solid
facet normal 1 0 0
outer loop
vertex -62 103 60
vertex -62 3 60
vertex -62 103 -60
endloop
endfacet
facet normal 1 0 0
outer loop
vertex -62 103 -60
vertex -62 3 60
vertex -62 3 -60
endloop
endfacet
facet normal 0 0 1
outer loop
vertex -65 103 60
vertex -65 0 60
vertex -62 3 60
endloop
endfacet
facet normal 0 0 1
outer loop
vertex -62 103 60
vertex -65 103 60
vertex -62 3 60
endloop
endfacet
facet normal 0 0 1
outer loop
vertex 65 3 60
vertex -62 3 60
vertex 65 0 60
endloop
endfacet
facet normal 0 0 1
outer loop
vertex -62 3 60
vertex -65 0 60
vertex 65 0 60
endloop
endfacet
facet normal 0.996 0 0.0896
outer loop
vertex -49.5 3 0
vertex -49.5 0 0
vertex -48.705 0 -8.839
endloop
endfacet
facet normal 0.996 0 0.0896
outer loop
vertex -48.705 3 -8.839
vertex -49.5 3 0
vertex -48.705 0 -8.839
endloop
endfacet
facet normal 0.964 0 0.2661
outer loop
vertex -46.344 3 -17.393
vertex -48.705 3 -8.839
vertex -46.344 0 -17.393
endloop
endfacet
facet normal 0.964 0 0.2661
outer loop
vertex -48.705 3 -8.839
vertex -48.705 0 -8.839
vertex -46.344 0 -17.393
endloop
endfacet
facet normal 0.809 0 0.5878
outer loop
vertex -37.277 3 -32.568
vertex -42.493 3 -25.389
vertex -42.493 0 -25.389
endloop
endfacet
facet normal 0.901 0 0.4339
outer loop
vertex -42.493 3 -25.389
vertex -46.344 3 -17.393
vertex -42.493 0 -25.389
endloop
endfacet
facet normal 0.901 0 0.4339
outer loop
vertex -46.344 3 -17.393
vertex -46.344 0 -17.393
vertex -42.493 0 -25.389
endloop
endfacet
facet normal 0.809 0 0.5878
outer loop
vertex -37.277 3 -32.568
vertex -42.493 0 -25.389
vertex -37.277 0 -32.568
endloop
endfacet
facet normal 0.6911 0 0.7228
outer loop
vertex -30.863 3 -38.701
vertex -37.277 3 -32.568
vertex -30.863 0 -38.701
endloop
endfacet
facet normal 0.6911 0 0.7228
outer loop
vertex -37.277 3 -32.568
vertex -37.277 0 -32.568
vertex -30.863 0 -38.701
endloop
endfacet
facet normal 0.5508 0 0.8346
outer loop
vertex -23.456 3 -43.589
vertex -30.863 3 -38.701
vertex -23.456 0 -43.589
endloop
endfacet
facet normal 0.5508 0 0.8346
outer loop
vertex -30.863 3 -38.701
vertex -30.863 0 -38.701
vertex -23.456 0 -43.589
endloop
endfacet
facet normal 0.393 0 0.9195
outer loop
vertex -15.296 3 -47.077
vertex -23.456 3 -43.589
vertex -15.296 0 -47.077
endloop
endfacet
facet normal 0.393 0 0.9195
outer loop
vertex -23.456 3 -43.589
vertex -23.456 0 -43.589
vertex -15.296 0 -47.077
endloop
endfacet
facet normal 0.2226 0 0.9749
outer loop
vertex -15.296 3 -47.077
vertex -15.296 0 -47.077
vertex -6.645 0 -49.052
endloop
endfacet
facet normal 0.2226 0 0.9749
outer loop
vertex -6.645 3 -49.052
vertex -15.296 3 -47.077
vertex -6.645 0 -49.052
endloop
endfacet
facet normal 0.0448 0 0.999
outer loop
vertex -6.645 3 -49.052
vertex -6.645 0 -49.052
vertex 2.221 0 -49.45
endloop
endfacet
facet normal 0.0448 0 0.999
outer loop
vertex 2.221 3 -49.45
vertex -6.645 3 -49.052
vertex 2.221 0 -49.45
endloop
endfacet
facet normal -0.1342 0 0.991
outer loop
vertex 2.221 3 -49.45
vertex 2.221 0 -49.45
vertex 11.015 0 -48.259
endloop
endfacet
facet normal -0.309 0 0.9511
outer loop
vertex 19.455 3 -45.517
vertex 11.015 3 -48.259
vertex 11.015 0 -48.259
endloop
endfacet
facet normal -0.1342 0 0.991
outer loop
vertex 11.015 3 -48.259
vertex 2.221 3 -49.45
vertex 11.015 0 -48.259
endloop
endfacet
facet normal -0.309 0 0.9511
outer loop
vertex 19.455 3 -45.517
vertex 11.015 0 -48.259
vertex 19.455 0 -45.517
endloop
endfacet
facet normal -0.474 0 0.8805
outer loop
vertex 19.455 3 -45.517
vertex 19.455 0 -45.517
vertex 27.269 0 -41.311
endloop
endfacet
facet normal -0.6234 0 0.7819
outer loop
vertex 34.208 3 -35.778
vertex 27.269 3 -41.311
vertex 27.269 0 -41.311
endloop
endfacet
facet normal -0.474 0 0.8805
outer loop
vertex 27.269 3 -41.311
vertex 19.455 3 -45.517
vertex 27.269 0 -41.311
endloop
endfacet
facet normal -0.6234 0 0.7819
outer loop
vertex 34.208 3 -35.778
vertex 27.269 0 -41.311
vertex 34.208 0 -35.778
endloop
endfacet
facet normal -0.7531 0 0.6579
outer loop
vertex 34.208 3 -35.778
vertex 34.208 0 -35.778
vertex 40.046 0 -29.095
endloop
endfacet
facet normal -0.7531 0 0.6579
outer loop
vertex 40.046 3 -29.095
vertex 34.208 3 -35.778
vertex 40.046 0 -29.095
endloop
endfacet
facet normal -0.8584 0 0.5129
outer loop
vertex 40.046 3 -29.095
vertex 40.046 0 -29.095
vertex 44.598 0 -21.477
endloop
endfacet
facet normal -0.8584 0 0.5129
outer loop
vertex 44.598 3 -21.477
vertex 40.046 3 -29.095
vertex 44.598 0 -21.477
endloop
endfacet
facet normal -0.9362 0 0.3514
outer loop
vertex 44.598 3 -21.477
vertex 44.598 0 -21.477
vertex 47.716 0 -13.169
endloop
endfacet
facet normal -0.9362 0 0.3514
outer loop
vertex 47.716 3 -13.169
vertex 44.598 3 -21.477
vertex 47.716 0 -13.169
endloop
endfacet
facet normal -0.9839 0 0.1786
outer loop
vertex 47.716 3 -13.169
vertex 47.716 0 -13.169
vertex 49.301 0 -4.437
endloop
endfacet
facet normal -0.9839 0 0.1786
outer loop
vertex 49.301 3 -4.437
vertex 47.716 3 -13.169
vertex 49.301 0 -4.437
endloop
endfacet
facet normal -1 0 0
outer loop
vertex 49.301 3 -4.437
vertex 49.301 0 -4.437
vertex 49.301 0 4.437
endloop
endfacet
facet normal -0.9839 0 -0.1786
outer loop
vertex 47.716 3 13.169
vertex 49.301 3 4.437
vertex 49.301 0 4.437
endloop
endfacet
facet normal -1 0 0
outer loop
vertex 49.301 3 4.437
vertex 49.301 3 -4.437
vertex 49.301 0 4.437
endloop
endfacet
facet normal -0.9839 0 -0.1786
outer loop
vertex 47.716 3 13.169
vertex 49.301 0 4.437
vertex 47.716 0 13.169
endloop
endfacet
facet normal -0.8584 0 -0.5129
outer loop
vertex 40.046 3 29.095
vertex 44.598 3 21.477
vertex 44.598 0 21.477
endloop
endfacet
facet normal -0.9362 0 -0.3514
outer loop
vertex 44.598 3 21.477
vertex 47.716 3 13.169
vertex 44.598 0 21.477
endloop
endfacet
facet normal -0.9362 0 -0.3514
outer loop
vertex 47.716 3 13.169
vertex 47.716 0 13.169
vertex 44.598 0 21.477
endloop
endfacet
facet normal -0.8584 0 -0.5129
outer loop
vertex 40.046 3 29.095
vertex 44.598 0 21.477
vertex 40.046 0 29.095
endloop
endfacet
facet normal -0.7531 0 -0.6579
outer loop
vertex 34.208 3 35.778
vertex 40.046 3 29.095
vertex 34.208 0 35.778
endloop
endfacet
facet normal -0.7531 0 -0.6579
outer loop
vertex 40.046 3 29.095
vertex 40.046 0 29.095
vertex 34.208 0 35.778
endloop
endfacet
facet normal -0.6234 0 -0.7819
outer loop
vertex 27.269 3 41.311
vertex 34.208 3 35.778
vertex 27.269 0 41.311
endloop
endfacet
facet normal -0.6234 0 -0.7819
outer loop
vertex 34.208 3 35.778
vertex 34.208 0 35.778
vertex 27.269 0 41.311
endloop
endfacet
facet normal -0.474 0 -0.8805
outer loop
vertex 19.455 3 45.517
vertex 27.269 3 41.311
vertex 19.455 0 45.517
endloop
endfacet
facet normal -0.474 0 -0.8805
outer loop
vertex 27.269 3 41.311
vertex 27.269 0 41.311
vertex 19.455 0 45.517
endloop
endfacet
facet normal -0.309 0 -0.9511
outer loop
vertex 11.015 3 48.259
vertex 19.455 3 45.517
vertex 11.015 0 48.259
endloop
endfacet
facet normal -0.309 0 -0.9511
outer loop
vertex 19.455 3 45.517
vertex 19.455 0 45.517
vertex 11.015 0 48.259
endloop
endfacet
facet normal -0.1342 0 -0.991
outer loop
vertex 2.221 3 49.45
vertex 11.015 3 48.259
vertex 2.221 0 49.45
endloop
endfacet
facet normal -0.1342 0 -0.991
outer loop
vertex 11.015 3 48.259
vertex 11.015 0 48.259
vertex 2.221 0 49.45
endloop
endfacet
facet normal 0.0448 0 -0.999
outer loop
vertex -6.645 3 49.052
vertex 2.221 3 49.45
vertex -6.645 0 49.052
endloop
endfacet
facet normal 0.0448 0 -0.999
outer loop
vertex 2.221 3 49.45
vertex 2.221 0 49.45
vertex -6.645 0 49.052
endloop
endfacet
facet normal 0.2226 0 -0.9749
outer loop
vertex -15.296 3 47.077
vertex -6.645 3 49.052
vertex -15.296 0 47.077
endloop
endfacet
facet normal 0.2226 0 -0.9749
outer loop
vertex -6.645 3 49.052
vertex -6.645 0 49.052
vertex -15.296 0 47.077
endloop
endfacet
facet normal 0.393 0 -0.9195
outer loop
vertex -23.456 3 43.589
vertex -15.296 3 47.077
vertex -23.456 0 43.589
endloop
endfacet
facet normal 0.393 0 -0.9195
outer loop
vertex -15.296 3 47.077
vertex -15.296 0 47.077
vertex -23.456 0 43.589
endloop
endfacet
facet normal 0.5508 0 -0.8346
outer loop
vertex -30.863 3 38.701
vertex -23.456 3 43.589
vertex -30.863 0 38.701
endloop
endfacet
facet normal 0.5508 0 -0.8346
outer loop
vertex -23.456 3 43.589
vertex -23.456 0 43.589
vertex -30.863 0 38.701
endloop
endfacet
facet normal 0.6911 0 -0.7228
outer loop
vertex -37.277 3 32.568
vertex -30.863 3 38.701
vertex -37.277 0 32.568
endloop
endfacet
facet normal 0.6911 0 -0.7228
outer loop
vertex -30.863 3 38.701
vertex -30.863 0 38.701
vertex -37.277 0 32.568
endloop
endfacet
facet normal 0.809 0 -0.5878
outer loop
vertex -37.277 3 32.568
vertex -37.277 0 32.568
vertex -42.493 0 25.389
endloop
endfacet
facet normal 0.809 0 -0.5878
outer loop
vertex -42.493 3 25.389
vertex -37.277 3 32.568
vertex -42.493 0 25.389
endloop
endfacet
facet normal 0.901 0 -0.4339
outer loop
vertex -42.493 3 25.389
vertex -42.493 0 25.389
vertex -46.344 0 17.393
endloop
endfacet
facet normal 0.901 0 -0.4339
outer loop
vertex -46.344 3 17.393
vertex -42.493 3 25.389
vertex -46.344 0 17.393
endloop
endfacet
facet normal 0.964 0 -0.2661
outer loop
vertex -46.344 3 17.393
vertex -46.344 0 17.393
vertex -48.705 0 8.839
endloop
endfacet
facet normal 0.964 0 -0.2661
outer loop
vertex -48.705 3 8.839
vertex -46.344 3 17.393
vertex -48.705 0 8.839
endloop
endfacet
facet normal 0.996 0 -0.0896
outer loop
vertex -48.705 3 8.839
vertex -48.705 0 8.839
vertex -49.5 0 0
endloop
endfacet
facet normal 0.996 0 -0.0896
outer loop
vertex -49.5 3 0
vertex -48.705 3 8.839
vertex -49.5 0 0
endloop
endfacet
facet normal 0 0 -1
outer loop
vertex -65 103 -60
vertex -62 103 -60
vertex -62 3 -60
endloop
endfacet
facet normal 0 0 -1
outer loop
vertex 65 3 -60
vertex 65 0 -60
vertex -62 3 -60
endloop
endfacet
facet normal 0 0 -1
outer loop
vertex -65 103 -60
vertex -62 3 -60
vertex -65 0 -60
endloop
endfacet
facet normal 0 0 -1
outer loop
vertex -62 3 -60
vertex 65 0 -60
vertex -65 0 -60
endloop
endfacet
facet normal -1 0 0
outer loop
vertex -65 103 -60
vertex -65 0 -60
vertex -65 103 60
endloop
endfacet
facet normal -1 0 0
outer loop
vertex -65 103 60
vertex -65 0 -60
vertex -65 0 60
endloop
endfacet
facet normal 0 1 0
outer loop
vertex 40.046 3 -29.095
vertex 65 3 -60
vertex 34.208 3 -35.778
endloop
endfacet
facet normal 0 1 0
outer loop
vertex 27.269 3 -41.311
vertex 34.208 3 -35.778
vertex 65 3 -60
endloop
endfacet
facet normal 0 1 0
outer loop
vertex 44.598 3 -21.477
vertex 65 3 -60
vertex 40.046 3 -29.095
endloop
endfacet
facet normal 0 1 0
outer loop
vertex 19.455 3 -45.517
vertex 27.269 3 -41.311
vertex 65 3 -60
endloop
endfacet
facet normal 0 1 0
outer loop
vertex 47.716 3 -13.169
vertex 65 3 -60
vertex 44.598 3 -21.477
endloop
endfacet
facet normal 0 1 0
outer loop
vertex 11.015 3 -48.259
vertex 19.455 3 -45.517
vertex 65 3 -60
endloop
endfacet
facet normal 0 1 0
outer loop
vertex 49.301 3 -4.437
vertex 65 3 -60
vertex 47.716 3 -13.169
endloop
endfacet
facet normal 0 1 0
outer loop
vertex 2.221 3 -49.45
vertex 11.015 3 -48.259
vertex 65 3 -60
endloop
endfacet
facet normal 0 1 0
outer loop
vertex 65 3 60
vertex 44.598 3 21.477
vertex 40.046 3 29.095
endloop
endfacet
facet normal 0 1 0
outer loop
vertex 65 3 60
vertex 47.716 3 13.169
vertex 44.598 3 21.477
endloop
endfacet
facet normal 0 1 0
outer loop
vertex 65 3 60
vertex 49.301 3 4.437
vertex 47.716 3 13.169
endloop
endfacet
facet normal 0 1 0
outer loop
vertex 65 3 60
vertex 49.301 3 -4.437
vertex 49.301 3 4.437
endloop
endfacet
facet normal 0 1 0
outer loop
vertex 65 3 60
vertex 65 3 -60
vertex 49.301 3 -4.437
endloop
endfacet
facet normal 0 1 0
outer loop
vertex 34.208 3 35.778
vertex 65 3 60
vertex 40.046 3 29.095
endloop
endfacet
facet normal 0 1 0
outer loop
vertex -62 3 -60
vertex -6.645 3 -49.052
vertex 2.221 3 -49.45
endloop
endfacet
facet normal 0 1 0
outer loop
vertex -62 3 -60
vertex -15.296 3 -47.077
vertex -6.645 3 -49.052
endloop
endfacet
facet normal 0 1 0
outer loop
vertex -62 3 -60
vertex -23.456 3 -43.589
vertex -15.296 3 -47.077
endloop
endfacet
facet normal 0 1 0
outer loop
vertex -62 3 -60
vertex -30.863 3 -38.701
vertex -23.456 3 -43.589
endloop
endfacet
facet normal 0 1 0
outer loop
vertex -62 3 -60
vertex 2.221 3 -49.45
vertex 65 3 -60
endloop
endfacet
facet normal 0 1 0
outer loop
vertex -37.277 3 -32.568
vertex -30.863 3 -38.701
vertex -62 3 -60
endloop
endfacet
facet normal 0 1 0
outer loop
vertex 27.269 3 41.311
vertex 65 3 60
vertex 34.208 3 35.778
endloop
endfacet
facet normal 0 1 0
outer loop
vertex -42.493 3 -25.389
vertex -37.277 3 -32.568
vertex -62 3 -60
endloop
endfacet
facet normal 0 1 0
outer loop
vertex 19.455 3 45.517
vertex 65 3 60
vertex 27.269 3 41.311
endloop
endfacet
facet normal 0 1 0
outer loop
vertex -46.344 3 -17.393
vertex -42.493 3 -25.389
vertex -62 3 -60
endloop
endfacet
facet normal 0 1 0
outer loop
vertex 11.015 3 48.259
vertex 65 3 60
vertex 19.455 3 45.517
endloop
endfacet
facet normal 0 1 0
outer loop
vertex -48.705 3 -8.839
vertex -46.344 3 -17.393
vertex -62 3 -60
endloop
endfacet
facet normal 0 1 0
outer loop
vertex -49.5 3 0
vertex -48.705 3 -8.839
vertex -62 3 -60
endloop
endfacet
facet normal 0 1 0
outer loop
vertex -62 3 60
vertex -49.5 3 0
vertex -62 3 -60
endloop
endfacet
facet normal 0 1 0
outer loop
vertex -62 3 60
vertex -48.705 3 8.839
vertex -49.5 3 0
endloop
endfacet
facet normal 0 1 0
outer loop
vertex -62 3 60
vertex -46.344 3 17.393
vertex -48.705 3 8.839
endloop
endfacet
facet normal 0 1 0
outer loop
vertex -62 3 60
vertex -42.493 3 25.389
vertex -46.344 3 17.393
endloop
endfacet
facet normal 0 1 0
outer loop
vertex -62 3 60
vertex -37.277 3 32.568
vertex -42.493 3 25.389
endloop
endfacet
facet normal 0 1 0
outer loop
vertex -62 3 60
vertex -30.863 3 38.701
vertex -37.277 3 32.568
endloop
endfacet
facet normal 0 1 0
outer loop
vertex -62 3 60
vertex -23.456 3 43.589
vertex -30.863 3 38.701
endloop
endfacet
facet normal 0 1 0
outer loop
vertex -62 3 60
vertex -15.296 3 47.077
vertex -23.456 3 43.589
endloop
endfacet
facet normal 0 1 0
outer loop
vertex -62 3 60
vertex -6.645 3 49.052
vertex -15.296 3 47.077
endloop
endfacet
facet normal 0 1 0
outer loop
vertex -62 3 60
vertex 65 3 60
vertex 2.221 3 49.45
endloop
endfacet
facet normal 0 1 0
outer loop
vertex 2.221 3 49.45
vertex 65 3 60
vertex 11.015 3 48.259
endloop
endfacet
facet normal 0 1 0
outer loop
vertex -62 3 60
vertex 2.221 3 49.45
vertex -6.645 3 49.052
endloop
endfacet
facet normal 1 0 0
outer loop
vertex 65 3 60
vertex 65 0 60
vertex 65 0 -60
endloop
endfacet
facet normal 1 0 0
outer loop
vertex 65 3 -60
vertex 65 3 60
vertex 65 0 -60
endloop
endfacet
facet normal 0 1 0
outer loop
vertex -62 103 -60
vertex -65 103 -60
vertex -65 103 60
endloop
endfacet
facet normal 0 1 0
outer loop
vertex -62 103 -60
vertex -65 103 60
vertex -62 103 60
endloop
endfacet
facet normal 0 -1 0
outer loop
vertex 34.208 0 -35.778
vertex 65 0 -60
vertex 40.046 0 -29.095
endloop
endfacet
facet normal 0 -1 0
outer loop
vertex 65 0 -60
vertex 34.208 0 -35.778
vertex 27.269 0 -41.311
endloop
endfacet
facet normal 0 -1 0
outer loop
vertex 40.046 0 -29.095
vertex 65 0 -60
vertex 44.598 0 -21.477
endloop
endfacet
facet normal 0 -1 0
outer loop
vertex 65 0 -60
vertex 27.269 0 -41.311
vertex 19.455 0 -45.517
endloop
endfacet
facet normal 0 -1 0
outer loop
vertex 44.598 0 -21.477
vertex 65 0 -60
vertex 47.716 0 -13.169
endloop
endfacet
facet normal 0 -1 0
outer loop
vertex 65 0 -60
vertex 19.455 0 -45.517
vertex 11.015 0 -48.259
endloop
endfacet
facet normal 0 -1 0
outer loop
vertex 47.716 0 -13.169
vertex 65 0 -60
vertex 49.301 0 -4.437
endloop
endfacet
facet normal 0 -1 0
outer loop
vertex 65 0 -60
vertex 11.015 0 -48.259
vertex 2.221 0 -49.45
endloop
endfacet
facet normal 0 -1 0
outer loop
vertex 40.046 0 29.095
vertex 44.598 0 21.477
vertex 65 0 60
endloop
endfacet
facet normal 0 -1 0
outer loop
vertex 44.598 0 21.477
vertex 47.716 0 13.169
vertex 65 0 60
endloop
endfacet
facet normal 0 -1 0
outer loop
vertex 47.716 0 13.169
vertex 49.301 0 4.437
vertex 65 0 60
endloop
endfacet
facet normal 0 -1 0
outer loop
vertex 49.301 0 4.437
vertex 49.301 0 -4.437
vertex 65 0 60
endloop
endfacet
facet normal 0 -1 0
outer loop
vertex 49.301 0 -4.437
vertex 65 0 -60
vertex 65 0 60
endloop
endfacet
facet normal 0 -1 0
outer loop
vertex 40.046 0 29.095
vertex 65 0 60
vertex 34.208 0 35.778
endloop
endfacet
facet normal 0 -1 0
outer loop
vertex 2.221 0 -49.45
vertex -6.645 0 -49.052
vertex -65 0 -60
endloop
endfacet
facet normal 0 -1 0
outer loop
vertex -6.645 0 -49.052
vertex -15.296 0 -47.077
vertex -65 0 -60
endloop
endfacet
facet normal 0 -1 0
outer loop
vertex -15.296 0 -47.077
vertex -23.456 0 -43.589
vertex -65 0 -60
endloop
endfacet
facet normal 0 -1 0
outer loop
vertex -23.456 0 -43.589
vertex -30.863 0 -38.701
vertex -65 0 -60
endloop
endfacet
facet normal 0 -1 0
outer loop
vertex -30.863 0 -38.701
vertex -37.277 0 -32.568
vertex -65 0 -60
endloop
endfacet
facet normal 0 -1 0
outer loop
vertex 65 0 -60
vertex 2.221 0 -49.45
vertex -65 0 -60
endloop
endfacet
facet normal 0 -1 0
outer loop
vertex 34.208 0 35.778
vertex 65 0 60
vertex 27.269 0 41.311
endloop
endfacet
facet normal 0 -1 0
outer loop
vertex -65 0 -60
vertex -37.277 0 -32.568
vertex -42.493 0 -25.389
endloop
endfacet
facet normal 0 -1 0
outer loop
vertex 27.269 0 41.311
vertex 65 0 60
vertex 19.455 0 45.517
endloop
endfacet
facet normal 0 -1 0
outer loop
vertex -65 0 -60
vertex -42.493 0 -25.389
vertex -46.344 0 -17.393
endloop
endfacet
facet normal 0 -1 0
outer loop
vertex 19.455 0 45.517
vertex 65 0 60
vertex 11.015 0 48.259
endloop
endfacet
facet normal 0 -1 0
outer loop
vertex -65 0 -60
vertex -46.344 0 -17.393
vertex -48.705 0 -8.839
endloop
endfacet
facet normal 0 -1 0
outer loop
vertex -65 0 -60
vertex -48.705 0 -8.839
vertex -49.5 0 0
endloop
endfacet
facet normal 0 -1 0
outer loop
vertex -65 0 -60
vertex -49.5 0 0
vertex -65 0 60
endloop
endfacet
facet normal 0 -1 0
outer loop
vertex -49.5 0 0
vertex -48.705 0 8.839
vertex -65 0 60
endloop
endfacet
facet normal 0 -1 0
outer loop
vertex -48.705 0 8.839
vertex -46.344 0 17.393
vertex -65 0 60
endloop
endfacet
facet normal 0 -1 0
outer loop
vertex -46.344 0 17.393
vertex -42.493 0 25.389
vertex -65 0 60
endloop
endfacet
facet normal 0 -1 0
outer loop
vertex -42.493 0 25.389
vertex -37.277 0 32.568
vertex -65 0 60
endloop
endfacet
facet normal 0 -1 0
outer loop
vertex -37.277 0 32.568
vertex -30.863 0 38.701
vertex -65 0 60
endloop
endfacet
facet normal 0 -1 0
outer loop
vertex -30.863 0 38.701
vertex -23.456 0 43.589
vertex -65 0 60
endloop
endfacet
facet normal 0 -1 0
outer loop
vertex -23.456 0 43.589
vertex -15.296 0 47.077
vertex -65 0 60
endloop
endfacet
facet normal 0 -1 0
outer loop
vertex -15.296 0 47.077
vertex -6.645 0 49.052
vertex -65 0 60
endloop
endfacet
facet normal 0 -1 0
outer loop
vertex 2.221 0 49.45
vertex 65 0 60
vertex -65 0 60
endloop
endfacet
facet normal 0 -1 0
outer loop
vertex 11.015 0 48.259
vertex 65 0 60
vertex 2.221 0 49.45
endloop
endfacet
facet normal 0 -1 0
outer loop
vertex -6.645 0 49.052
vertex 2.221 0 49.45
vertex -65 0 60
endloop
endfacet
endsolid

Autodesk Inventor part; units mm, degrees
ref_plane "YZ Plane" through (0, 0, 0) normal (1, 0, 0) x (0, 1, 0)
ref_plane "XZ Plane" through (0, 0, 0) normal (0, 1, 0) x (-1, 0, 0)
ref_plane "XY Plane" through (0, 0, 0) normal (0, 0, 1) x (1, 0, 0)
sketch "Sketch1" plane through (0, 0, 0) normal (0, 1, 0) x (-1, 0, 0)
  circle A0 centre (0, 0) radius 49.5
  line L0 (65, 60) -> (-65, 60)
  line L1 (-65, 60) -> (-65, -60)
  line L2 (-65, -60) -> (65, -60)
  line L3 (65, -60) -> (65, 60)
  line L4 (65, 60) -> (-65, -60) construction
  line L5 (-65, 60) -> (65, -60) construction
  dimension "d0" = 99
  dimension "d1" = 130
  dimension "d2" = 120
extrude "Extrusion1" add sketch "Sketch1" along normal blind 3
sketch "Sketch2" plane through (0, 3, 0) normal (0, 1, 0) x (1, 0, 0)
  line L0 (-65, -60) -> (-62, -60)
  line L1 (-62, -60) -> (-62, 60)
  line L2 (-62, 60) -> (-65, 60)
  line L3 (-65, 60) -> (-65, -60)
  line L4 (-65, -60) -> (-62, 60) construction
  line L5 (-62, -60) -> (-65, 60) construction
  line L6 (-65, 60) -> (-65, -60) projected
  point P0 (0, 0)
  point P1 (-63.5, 0)
  point P2 (-65, 0)
  dimension "d5" = 3
  dimension "d6" = 120
extrude "Extrusion2" add sketch "Sketch2" along normal blind 100
properties part number "ammonia filter bracket"
